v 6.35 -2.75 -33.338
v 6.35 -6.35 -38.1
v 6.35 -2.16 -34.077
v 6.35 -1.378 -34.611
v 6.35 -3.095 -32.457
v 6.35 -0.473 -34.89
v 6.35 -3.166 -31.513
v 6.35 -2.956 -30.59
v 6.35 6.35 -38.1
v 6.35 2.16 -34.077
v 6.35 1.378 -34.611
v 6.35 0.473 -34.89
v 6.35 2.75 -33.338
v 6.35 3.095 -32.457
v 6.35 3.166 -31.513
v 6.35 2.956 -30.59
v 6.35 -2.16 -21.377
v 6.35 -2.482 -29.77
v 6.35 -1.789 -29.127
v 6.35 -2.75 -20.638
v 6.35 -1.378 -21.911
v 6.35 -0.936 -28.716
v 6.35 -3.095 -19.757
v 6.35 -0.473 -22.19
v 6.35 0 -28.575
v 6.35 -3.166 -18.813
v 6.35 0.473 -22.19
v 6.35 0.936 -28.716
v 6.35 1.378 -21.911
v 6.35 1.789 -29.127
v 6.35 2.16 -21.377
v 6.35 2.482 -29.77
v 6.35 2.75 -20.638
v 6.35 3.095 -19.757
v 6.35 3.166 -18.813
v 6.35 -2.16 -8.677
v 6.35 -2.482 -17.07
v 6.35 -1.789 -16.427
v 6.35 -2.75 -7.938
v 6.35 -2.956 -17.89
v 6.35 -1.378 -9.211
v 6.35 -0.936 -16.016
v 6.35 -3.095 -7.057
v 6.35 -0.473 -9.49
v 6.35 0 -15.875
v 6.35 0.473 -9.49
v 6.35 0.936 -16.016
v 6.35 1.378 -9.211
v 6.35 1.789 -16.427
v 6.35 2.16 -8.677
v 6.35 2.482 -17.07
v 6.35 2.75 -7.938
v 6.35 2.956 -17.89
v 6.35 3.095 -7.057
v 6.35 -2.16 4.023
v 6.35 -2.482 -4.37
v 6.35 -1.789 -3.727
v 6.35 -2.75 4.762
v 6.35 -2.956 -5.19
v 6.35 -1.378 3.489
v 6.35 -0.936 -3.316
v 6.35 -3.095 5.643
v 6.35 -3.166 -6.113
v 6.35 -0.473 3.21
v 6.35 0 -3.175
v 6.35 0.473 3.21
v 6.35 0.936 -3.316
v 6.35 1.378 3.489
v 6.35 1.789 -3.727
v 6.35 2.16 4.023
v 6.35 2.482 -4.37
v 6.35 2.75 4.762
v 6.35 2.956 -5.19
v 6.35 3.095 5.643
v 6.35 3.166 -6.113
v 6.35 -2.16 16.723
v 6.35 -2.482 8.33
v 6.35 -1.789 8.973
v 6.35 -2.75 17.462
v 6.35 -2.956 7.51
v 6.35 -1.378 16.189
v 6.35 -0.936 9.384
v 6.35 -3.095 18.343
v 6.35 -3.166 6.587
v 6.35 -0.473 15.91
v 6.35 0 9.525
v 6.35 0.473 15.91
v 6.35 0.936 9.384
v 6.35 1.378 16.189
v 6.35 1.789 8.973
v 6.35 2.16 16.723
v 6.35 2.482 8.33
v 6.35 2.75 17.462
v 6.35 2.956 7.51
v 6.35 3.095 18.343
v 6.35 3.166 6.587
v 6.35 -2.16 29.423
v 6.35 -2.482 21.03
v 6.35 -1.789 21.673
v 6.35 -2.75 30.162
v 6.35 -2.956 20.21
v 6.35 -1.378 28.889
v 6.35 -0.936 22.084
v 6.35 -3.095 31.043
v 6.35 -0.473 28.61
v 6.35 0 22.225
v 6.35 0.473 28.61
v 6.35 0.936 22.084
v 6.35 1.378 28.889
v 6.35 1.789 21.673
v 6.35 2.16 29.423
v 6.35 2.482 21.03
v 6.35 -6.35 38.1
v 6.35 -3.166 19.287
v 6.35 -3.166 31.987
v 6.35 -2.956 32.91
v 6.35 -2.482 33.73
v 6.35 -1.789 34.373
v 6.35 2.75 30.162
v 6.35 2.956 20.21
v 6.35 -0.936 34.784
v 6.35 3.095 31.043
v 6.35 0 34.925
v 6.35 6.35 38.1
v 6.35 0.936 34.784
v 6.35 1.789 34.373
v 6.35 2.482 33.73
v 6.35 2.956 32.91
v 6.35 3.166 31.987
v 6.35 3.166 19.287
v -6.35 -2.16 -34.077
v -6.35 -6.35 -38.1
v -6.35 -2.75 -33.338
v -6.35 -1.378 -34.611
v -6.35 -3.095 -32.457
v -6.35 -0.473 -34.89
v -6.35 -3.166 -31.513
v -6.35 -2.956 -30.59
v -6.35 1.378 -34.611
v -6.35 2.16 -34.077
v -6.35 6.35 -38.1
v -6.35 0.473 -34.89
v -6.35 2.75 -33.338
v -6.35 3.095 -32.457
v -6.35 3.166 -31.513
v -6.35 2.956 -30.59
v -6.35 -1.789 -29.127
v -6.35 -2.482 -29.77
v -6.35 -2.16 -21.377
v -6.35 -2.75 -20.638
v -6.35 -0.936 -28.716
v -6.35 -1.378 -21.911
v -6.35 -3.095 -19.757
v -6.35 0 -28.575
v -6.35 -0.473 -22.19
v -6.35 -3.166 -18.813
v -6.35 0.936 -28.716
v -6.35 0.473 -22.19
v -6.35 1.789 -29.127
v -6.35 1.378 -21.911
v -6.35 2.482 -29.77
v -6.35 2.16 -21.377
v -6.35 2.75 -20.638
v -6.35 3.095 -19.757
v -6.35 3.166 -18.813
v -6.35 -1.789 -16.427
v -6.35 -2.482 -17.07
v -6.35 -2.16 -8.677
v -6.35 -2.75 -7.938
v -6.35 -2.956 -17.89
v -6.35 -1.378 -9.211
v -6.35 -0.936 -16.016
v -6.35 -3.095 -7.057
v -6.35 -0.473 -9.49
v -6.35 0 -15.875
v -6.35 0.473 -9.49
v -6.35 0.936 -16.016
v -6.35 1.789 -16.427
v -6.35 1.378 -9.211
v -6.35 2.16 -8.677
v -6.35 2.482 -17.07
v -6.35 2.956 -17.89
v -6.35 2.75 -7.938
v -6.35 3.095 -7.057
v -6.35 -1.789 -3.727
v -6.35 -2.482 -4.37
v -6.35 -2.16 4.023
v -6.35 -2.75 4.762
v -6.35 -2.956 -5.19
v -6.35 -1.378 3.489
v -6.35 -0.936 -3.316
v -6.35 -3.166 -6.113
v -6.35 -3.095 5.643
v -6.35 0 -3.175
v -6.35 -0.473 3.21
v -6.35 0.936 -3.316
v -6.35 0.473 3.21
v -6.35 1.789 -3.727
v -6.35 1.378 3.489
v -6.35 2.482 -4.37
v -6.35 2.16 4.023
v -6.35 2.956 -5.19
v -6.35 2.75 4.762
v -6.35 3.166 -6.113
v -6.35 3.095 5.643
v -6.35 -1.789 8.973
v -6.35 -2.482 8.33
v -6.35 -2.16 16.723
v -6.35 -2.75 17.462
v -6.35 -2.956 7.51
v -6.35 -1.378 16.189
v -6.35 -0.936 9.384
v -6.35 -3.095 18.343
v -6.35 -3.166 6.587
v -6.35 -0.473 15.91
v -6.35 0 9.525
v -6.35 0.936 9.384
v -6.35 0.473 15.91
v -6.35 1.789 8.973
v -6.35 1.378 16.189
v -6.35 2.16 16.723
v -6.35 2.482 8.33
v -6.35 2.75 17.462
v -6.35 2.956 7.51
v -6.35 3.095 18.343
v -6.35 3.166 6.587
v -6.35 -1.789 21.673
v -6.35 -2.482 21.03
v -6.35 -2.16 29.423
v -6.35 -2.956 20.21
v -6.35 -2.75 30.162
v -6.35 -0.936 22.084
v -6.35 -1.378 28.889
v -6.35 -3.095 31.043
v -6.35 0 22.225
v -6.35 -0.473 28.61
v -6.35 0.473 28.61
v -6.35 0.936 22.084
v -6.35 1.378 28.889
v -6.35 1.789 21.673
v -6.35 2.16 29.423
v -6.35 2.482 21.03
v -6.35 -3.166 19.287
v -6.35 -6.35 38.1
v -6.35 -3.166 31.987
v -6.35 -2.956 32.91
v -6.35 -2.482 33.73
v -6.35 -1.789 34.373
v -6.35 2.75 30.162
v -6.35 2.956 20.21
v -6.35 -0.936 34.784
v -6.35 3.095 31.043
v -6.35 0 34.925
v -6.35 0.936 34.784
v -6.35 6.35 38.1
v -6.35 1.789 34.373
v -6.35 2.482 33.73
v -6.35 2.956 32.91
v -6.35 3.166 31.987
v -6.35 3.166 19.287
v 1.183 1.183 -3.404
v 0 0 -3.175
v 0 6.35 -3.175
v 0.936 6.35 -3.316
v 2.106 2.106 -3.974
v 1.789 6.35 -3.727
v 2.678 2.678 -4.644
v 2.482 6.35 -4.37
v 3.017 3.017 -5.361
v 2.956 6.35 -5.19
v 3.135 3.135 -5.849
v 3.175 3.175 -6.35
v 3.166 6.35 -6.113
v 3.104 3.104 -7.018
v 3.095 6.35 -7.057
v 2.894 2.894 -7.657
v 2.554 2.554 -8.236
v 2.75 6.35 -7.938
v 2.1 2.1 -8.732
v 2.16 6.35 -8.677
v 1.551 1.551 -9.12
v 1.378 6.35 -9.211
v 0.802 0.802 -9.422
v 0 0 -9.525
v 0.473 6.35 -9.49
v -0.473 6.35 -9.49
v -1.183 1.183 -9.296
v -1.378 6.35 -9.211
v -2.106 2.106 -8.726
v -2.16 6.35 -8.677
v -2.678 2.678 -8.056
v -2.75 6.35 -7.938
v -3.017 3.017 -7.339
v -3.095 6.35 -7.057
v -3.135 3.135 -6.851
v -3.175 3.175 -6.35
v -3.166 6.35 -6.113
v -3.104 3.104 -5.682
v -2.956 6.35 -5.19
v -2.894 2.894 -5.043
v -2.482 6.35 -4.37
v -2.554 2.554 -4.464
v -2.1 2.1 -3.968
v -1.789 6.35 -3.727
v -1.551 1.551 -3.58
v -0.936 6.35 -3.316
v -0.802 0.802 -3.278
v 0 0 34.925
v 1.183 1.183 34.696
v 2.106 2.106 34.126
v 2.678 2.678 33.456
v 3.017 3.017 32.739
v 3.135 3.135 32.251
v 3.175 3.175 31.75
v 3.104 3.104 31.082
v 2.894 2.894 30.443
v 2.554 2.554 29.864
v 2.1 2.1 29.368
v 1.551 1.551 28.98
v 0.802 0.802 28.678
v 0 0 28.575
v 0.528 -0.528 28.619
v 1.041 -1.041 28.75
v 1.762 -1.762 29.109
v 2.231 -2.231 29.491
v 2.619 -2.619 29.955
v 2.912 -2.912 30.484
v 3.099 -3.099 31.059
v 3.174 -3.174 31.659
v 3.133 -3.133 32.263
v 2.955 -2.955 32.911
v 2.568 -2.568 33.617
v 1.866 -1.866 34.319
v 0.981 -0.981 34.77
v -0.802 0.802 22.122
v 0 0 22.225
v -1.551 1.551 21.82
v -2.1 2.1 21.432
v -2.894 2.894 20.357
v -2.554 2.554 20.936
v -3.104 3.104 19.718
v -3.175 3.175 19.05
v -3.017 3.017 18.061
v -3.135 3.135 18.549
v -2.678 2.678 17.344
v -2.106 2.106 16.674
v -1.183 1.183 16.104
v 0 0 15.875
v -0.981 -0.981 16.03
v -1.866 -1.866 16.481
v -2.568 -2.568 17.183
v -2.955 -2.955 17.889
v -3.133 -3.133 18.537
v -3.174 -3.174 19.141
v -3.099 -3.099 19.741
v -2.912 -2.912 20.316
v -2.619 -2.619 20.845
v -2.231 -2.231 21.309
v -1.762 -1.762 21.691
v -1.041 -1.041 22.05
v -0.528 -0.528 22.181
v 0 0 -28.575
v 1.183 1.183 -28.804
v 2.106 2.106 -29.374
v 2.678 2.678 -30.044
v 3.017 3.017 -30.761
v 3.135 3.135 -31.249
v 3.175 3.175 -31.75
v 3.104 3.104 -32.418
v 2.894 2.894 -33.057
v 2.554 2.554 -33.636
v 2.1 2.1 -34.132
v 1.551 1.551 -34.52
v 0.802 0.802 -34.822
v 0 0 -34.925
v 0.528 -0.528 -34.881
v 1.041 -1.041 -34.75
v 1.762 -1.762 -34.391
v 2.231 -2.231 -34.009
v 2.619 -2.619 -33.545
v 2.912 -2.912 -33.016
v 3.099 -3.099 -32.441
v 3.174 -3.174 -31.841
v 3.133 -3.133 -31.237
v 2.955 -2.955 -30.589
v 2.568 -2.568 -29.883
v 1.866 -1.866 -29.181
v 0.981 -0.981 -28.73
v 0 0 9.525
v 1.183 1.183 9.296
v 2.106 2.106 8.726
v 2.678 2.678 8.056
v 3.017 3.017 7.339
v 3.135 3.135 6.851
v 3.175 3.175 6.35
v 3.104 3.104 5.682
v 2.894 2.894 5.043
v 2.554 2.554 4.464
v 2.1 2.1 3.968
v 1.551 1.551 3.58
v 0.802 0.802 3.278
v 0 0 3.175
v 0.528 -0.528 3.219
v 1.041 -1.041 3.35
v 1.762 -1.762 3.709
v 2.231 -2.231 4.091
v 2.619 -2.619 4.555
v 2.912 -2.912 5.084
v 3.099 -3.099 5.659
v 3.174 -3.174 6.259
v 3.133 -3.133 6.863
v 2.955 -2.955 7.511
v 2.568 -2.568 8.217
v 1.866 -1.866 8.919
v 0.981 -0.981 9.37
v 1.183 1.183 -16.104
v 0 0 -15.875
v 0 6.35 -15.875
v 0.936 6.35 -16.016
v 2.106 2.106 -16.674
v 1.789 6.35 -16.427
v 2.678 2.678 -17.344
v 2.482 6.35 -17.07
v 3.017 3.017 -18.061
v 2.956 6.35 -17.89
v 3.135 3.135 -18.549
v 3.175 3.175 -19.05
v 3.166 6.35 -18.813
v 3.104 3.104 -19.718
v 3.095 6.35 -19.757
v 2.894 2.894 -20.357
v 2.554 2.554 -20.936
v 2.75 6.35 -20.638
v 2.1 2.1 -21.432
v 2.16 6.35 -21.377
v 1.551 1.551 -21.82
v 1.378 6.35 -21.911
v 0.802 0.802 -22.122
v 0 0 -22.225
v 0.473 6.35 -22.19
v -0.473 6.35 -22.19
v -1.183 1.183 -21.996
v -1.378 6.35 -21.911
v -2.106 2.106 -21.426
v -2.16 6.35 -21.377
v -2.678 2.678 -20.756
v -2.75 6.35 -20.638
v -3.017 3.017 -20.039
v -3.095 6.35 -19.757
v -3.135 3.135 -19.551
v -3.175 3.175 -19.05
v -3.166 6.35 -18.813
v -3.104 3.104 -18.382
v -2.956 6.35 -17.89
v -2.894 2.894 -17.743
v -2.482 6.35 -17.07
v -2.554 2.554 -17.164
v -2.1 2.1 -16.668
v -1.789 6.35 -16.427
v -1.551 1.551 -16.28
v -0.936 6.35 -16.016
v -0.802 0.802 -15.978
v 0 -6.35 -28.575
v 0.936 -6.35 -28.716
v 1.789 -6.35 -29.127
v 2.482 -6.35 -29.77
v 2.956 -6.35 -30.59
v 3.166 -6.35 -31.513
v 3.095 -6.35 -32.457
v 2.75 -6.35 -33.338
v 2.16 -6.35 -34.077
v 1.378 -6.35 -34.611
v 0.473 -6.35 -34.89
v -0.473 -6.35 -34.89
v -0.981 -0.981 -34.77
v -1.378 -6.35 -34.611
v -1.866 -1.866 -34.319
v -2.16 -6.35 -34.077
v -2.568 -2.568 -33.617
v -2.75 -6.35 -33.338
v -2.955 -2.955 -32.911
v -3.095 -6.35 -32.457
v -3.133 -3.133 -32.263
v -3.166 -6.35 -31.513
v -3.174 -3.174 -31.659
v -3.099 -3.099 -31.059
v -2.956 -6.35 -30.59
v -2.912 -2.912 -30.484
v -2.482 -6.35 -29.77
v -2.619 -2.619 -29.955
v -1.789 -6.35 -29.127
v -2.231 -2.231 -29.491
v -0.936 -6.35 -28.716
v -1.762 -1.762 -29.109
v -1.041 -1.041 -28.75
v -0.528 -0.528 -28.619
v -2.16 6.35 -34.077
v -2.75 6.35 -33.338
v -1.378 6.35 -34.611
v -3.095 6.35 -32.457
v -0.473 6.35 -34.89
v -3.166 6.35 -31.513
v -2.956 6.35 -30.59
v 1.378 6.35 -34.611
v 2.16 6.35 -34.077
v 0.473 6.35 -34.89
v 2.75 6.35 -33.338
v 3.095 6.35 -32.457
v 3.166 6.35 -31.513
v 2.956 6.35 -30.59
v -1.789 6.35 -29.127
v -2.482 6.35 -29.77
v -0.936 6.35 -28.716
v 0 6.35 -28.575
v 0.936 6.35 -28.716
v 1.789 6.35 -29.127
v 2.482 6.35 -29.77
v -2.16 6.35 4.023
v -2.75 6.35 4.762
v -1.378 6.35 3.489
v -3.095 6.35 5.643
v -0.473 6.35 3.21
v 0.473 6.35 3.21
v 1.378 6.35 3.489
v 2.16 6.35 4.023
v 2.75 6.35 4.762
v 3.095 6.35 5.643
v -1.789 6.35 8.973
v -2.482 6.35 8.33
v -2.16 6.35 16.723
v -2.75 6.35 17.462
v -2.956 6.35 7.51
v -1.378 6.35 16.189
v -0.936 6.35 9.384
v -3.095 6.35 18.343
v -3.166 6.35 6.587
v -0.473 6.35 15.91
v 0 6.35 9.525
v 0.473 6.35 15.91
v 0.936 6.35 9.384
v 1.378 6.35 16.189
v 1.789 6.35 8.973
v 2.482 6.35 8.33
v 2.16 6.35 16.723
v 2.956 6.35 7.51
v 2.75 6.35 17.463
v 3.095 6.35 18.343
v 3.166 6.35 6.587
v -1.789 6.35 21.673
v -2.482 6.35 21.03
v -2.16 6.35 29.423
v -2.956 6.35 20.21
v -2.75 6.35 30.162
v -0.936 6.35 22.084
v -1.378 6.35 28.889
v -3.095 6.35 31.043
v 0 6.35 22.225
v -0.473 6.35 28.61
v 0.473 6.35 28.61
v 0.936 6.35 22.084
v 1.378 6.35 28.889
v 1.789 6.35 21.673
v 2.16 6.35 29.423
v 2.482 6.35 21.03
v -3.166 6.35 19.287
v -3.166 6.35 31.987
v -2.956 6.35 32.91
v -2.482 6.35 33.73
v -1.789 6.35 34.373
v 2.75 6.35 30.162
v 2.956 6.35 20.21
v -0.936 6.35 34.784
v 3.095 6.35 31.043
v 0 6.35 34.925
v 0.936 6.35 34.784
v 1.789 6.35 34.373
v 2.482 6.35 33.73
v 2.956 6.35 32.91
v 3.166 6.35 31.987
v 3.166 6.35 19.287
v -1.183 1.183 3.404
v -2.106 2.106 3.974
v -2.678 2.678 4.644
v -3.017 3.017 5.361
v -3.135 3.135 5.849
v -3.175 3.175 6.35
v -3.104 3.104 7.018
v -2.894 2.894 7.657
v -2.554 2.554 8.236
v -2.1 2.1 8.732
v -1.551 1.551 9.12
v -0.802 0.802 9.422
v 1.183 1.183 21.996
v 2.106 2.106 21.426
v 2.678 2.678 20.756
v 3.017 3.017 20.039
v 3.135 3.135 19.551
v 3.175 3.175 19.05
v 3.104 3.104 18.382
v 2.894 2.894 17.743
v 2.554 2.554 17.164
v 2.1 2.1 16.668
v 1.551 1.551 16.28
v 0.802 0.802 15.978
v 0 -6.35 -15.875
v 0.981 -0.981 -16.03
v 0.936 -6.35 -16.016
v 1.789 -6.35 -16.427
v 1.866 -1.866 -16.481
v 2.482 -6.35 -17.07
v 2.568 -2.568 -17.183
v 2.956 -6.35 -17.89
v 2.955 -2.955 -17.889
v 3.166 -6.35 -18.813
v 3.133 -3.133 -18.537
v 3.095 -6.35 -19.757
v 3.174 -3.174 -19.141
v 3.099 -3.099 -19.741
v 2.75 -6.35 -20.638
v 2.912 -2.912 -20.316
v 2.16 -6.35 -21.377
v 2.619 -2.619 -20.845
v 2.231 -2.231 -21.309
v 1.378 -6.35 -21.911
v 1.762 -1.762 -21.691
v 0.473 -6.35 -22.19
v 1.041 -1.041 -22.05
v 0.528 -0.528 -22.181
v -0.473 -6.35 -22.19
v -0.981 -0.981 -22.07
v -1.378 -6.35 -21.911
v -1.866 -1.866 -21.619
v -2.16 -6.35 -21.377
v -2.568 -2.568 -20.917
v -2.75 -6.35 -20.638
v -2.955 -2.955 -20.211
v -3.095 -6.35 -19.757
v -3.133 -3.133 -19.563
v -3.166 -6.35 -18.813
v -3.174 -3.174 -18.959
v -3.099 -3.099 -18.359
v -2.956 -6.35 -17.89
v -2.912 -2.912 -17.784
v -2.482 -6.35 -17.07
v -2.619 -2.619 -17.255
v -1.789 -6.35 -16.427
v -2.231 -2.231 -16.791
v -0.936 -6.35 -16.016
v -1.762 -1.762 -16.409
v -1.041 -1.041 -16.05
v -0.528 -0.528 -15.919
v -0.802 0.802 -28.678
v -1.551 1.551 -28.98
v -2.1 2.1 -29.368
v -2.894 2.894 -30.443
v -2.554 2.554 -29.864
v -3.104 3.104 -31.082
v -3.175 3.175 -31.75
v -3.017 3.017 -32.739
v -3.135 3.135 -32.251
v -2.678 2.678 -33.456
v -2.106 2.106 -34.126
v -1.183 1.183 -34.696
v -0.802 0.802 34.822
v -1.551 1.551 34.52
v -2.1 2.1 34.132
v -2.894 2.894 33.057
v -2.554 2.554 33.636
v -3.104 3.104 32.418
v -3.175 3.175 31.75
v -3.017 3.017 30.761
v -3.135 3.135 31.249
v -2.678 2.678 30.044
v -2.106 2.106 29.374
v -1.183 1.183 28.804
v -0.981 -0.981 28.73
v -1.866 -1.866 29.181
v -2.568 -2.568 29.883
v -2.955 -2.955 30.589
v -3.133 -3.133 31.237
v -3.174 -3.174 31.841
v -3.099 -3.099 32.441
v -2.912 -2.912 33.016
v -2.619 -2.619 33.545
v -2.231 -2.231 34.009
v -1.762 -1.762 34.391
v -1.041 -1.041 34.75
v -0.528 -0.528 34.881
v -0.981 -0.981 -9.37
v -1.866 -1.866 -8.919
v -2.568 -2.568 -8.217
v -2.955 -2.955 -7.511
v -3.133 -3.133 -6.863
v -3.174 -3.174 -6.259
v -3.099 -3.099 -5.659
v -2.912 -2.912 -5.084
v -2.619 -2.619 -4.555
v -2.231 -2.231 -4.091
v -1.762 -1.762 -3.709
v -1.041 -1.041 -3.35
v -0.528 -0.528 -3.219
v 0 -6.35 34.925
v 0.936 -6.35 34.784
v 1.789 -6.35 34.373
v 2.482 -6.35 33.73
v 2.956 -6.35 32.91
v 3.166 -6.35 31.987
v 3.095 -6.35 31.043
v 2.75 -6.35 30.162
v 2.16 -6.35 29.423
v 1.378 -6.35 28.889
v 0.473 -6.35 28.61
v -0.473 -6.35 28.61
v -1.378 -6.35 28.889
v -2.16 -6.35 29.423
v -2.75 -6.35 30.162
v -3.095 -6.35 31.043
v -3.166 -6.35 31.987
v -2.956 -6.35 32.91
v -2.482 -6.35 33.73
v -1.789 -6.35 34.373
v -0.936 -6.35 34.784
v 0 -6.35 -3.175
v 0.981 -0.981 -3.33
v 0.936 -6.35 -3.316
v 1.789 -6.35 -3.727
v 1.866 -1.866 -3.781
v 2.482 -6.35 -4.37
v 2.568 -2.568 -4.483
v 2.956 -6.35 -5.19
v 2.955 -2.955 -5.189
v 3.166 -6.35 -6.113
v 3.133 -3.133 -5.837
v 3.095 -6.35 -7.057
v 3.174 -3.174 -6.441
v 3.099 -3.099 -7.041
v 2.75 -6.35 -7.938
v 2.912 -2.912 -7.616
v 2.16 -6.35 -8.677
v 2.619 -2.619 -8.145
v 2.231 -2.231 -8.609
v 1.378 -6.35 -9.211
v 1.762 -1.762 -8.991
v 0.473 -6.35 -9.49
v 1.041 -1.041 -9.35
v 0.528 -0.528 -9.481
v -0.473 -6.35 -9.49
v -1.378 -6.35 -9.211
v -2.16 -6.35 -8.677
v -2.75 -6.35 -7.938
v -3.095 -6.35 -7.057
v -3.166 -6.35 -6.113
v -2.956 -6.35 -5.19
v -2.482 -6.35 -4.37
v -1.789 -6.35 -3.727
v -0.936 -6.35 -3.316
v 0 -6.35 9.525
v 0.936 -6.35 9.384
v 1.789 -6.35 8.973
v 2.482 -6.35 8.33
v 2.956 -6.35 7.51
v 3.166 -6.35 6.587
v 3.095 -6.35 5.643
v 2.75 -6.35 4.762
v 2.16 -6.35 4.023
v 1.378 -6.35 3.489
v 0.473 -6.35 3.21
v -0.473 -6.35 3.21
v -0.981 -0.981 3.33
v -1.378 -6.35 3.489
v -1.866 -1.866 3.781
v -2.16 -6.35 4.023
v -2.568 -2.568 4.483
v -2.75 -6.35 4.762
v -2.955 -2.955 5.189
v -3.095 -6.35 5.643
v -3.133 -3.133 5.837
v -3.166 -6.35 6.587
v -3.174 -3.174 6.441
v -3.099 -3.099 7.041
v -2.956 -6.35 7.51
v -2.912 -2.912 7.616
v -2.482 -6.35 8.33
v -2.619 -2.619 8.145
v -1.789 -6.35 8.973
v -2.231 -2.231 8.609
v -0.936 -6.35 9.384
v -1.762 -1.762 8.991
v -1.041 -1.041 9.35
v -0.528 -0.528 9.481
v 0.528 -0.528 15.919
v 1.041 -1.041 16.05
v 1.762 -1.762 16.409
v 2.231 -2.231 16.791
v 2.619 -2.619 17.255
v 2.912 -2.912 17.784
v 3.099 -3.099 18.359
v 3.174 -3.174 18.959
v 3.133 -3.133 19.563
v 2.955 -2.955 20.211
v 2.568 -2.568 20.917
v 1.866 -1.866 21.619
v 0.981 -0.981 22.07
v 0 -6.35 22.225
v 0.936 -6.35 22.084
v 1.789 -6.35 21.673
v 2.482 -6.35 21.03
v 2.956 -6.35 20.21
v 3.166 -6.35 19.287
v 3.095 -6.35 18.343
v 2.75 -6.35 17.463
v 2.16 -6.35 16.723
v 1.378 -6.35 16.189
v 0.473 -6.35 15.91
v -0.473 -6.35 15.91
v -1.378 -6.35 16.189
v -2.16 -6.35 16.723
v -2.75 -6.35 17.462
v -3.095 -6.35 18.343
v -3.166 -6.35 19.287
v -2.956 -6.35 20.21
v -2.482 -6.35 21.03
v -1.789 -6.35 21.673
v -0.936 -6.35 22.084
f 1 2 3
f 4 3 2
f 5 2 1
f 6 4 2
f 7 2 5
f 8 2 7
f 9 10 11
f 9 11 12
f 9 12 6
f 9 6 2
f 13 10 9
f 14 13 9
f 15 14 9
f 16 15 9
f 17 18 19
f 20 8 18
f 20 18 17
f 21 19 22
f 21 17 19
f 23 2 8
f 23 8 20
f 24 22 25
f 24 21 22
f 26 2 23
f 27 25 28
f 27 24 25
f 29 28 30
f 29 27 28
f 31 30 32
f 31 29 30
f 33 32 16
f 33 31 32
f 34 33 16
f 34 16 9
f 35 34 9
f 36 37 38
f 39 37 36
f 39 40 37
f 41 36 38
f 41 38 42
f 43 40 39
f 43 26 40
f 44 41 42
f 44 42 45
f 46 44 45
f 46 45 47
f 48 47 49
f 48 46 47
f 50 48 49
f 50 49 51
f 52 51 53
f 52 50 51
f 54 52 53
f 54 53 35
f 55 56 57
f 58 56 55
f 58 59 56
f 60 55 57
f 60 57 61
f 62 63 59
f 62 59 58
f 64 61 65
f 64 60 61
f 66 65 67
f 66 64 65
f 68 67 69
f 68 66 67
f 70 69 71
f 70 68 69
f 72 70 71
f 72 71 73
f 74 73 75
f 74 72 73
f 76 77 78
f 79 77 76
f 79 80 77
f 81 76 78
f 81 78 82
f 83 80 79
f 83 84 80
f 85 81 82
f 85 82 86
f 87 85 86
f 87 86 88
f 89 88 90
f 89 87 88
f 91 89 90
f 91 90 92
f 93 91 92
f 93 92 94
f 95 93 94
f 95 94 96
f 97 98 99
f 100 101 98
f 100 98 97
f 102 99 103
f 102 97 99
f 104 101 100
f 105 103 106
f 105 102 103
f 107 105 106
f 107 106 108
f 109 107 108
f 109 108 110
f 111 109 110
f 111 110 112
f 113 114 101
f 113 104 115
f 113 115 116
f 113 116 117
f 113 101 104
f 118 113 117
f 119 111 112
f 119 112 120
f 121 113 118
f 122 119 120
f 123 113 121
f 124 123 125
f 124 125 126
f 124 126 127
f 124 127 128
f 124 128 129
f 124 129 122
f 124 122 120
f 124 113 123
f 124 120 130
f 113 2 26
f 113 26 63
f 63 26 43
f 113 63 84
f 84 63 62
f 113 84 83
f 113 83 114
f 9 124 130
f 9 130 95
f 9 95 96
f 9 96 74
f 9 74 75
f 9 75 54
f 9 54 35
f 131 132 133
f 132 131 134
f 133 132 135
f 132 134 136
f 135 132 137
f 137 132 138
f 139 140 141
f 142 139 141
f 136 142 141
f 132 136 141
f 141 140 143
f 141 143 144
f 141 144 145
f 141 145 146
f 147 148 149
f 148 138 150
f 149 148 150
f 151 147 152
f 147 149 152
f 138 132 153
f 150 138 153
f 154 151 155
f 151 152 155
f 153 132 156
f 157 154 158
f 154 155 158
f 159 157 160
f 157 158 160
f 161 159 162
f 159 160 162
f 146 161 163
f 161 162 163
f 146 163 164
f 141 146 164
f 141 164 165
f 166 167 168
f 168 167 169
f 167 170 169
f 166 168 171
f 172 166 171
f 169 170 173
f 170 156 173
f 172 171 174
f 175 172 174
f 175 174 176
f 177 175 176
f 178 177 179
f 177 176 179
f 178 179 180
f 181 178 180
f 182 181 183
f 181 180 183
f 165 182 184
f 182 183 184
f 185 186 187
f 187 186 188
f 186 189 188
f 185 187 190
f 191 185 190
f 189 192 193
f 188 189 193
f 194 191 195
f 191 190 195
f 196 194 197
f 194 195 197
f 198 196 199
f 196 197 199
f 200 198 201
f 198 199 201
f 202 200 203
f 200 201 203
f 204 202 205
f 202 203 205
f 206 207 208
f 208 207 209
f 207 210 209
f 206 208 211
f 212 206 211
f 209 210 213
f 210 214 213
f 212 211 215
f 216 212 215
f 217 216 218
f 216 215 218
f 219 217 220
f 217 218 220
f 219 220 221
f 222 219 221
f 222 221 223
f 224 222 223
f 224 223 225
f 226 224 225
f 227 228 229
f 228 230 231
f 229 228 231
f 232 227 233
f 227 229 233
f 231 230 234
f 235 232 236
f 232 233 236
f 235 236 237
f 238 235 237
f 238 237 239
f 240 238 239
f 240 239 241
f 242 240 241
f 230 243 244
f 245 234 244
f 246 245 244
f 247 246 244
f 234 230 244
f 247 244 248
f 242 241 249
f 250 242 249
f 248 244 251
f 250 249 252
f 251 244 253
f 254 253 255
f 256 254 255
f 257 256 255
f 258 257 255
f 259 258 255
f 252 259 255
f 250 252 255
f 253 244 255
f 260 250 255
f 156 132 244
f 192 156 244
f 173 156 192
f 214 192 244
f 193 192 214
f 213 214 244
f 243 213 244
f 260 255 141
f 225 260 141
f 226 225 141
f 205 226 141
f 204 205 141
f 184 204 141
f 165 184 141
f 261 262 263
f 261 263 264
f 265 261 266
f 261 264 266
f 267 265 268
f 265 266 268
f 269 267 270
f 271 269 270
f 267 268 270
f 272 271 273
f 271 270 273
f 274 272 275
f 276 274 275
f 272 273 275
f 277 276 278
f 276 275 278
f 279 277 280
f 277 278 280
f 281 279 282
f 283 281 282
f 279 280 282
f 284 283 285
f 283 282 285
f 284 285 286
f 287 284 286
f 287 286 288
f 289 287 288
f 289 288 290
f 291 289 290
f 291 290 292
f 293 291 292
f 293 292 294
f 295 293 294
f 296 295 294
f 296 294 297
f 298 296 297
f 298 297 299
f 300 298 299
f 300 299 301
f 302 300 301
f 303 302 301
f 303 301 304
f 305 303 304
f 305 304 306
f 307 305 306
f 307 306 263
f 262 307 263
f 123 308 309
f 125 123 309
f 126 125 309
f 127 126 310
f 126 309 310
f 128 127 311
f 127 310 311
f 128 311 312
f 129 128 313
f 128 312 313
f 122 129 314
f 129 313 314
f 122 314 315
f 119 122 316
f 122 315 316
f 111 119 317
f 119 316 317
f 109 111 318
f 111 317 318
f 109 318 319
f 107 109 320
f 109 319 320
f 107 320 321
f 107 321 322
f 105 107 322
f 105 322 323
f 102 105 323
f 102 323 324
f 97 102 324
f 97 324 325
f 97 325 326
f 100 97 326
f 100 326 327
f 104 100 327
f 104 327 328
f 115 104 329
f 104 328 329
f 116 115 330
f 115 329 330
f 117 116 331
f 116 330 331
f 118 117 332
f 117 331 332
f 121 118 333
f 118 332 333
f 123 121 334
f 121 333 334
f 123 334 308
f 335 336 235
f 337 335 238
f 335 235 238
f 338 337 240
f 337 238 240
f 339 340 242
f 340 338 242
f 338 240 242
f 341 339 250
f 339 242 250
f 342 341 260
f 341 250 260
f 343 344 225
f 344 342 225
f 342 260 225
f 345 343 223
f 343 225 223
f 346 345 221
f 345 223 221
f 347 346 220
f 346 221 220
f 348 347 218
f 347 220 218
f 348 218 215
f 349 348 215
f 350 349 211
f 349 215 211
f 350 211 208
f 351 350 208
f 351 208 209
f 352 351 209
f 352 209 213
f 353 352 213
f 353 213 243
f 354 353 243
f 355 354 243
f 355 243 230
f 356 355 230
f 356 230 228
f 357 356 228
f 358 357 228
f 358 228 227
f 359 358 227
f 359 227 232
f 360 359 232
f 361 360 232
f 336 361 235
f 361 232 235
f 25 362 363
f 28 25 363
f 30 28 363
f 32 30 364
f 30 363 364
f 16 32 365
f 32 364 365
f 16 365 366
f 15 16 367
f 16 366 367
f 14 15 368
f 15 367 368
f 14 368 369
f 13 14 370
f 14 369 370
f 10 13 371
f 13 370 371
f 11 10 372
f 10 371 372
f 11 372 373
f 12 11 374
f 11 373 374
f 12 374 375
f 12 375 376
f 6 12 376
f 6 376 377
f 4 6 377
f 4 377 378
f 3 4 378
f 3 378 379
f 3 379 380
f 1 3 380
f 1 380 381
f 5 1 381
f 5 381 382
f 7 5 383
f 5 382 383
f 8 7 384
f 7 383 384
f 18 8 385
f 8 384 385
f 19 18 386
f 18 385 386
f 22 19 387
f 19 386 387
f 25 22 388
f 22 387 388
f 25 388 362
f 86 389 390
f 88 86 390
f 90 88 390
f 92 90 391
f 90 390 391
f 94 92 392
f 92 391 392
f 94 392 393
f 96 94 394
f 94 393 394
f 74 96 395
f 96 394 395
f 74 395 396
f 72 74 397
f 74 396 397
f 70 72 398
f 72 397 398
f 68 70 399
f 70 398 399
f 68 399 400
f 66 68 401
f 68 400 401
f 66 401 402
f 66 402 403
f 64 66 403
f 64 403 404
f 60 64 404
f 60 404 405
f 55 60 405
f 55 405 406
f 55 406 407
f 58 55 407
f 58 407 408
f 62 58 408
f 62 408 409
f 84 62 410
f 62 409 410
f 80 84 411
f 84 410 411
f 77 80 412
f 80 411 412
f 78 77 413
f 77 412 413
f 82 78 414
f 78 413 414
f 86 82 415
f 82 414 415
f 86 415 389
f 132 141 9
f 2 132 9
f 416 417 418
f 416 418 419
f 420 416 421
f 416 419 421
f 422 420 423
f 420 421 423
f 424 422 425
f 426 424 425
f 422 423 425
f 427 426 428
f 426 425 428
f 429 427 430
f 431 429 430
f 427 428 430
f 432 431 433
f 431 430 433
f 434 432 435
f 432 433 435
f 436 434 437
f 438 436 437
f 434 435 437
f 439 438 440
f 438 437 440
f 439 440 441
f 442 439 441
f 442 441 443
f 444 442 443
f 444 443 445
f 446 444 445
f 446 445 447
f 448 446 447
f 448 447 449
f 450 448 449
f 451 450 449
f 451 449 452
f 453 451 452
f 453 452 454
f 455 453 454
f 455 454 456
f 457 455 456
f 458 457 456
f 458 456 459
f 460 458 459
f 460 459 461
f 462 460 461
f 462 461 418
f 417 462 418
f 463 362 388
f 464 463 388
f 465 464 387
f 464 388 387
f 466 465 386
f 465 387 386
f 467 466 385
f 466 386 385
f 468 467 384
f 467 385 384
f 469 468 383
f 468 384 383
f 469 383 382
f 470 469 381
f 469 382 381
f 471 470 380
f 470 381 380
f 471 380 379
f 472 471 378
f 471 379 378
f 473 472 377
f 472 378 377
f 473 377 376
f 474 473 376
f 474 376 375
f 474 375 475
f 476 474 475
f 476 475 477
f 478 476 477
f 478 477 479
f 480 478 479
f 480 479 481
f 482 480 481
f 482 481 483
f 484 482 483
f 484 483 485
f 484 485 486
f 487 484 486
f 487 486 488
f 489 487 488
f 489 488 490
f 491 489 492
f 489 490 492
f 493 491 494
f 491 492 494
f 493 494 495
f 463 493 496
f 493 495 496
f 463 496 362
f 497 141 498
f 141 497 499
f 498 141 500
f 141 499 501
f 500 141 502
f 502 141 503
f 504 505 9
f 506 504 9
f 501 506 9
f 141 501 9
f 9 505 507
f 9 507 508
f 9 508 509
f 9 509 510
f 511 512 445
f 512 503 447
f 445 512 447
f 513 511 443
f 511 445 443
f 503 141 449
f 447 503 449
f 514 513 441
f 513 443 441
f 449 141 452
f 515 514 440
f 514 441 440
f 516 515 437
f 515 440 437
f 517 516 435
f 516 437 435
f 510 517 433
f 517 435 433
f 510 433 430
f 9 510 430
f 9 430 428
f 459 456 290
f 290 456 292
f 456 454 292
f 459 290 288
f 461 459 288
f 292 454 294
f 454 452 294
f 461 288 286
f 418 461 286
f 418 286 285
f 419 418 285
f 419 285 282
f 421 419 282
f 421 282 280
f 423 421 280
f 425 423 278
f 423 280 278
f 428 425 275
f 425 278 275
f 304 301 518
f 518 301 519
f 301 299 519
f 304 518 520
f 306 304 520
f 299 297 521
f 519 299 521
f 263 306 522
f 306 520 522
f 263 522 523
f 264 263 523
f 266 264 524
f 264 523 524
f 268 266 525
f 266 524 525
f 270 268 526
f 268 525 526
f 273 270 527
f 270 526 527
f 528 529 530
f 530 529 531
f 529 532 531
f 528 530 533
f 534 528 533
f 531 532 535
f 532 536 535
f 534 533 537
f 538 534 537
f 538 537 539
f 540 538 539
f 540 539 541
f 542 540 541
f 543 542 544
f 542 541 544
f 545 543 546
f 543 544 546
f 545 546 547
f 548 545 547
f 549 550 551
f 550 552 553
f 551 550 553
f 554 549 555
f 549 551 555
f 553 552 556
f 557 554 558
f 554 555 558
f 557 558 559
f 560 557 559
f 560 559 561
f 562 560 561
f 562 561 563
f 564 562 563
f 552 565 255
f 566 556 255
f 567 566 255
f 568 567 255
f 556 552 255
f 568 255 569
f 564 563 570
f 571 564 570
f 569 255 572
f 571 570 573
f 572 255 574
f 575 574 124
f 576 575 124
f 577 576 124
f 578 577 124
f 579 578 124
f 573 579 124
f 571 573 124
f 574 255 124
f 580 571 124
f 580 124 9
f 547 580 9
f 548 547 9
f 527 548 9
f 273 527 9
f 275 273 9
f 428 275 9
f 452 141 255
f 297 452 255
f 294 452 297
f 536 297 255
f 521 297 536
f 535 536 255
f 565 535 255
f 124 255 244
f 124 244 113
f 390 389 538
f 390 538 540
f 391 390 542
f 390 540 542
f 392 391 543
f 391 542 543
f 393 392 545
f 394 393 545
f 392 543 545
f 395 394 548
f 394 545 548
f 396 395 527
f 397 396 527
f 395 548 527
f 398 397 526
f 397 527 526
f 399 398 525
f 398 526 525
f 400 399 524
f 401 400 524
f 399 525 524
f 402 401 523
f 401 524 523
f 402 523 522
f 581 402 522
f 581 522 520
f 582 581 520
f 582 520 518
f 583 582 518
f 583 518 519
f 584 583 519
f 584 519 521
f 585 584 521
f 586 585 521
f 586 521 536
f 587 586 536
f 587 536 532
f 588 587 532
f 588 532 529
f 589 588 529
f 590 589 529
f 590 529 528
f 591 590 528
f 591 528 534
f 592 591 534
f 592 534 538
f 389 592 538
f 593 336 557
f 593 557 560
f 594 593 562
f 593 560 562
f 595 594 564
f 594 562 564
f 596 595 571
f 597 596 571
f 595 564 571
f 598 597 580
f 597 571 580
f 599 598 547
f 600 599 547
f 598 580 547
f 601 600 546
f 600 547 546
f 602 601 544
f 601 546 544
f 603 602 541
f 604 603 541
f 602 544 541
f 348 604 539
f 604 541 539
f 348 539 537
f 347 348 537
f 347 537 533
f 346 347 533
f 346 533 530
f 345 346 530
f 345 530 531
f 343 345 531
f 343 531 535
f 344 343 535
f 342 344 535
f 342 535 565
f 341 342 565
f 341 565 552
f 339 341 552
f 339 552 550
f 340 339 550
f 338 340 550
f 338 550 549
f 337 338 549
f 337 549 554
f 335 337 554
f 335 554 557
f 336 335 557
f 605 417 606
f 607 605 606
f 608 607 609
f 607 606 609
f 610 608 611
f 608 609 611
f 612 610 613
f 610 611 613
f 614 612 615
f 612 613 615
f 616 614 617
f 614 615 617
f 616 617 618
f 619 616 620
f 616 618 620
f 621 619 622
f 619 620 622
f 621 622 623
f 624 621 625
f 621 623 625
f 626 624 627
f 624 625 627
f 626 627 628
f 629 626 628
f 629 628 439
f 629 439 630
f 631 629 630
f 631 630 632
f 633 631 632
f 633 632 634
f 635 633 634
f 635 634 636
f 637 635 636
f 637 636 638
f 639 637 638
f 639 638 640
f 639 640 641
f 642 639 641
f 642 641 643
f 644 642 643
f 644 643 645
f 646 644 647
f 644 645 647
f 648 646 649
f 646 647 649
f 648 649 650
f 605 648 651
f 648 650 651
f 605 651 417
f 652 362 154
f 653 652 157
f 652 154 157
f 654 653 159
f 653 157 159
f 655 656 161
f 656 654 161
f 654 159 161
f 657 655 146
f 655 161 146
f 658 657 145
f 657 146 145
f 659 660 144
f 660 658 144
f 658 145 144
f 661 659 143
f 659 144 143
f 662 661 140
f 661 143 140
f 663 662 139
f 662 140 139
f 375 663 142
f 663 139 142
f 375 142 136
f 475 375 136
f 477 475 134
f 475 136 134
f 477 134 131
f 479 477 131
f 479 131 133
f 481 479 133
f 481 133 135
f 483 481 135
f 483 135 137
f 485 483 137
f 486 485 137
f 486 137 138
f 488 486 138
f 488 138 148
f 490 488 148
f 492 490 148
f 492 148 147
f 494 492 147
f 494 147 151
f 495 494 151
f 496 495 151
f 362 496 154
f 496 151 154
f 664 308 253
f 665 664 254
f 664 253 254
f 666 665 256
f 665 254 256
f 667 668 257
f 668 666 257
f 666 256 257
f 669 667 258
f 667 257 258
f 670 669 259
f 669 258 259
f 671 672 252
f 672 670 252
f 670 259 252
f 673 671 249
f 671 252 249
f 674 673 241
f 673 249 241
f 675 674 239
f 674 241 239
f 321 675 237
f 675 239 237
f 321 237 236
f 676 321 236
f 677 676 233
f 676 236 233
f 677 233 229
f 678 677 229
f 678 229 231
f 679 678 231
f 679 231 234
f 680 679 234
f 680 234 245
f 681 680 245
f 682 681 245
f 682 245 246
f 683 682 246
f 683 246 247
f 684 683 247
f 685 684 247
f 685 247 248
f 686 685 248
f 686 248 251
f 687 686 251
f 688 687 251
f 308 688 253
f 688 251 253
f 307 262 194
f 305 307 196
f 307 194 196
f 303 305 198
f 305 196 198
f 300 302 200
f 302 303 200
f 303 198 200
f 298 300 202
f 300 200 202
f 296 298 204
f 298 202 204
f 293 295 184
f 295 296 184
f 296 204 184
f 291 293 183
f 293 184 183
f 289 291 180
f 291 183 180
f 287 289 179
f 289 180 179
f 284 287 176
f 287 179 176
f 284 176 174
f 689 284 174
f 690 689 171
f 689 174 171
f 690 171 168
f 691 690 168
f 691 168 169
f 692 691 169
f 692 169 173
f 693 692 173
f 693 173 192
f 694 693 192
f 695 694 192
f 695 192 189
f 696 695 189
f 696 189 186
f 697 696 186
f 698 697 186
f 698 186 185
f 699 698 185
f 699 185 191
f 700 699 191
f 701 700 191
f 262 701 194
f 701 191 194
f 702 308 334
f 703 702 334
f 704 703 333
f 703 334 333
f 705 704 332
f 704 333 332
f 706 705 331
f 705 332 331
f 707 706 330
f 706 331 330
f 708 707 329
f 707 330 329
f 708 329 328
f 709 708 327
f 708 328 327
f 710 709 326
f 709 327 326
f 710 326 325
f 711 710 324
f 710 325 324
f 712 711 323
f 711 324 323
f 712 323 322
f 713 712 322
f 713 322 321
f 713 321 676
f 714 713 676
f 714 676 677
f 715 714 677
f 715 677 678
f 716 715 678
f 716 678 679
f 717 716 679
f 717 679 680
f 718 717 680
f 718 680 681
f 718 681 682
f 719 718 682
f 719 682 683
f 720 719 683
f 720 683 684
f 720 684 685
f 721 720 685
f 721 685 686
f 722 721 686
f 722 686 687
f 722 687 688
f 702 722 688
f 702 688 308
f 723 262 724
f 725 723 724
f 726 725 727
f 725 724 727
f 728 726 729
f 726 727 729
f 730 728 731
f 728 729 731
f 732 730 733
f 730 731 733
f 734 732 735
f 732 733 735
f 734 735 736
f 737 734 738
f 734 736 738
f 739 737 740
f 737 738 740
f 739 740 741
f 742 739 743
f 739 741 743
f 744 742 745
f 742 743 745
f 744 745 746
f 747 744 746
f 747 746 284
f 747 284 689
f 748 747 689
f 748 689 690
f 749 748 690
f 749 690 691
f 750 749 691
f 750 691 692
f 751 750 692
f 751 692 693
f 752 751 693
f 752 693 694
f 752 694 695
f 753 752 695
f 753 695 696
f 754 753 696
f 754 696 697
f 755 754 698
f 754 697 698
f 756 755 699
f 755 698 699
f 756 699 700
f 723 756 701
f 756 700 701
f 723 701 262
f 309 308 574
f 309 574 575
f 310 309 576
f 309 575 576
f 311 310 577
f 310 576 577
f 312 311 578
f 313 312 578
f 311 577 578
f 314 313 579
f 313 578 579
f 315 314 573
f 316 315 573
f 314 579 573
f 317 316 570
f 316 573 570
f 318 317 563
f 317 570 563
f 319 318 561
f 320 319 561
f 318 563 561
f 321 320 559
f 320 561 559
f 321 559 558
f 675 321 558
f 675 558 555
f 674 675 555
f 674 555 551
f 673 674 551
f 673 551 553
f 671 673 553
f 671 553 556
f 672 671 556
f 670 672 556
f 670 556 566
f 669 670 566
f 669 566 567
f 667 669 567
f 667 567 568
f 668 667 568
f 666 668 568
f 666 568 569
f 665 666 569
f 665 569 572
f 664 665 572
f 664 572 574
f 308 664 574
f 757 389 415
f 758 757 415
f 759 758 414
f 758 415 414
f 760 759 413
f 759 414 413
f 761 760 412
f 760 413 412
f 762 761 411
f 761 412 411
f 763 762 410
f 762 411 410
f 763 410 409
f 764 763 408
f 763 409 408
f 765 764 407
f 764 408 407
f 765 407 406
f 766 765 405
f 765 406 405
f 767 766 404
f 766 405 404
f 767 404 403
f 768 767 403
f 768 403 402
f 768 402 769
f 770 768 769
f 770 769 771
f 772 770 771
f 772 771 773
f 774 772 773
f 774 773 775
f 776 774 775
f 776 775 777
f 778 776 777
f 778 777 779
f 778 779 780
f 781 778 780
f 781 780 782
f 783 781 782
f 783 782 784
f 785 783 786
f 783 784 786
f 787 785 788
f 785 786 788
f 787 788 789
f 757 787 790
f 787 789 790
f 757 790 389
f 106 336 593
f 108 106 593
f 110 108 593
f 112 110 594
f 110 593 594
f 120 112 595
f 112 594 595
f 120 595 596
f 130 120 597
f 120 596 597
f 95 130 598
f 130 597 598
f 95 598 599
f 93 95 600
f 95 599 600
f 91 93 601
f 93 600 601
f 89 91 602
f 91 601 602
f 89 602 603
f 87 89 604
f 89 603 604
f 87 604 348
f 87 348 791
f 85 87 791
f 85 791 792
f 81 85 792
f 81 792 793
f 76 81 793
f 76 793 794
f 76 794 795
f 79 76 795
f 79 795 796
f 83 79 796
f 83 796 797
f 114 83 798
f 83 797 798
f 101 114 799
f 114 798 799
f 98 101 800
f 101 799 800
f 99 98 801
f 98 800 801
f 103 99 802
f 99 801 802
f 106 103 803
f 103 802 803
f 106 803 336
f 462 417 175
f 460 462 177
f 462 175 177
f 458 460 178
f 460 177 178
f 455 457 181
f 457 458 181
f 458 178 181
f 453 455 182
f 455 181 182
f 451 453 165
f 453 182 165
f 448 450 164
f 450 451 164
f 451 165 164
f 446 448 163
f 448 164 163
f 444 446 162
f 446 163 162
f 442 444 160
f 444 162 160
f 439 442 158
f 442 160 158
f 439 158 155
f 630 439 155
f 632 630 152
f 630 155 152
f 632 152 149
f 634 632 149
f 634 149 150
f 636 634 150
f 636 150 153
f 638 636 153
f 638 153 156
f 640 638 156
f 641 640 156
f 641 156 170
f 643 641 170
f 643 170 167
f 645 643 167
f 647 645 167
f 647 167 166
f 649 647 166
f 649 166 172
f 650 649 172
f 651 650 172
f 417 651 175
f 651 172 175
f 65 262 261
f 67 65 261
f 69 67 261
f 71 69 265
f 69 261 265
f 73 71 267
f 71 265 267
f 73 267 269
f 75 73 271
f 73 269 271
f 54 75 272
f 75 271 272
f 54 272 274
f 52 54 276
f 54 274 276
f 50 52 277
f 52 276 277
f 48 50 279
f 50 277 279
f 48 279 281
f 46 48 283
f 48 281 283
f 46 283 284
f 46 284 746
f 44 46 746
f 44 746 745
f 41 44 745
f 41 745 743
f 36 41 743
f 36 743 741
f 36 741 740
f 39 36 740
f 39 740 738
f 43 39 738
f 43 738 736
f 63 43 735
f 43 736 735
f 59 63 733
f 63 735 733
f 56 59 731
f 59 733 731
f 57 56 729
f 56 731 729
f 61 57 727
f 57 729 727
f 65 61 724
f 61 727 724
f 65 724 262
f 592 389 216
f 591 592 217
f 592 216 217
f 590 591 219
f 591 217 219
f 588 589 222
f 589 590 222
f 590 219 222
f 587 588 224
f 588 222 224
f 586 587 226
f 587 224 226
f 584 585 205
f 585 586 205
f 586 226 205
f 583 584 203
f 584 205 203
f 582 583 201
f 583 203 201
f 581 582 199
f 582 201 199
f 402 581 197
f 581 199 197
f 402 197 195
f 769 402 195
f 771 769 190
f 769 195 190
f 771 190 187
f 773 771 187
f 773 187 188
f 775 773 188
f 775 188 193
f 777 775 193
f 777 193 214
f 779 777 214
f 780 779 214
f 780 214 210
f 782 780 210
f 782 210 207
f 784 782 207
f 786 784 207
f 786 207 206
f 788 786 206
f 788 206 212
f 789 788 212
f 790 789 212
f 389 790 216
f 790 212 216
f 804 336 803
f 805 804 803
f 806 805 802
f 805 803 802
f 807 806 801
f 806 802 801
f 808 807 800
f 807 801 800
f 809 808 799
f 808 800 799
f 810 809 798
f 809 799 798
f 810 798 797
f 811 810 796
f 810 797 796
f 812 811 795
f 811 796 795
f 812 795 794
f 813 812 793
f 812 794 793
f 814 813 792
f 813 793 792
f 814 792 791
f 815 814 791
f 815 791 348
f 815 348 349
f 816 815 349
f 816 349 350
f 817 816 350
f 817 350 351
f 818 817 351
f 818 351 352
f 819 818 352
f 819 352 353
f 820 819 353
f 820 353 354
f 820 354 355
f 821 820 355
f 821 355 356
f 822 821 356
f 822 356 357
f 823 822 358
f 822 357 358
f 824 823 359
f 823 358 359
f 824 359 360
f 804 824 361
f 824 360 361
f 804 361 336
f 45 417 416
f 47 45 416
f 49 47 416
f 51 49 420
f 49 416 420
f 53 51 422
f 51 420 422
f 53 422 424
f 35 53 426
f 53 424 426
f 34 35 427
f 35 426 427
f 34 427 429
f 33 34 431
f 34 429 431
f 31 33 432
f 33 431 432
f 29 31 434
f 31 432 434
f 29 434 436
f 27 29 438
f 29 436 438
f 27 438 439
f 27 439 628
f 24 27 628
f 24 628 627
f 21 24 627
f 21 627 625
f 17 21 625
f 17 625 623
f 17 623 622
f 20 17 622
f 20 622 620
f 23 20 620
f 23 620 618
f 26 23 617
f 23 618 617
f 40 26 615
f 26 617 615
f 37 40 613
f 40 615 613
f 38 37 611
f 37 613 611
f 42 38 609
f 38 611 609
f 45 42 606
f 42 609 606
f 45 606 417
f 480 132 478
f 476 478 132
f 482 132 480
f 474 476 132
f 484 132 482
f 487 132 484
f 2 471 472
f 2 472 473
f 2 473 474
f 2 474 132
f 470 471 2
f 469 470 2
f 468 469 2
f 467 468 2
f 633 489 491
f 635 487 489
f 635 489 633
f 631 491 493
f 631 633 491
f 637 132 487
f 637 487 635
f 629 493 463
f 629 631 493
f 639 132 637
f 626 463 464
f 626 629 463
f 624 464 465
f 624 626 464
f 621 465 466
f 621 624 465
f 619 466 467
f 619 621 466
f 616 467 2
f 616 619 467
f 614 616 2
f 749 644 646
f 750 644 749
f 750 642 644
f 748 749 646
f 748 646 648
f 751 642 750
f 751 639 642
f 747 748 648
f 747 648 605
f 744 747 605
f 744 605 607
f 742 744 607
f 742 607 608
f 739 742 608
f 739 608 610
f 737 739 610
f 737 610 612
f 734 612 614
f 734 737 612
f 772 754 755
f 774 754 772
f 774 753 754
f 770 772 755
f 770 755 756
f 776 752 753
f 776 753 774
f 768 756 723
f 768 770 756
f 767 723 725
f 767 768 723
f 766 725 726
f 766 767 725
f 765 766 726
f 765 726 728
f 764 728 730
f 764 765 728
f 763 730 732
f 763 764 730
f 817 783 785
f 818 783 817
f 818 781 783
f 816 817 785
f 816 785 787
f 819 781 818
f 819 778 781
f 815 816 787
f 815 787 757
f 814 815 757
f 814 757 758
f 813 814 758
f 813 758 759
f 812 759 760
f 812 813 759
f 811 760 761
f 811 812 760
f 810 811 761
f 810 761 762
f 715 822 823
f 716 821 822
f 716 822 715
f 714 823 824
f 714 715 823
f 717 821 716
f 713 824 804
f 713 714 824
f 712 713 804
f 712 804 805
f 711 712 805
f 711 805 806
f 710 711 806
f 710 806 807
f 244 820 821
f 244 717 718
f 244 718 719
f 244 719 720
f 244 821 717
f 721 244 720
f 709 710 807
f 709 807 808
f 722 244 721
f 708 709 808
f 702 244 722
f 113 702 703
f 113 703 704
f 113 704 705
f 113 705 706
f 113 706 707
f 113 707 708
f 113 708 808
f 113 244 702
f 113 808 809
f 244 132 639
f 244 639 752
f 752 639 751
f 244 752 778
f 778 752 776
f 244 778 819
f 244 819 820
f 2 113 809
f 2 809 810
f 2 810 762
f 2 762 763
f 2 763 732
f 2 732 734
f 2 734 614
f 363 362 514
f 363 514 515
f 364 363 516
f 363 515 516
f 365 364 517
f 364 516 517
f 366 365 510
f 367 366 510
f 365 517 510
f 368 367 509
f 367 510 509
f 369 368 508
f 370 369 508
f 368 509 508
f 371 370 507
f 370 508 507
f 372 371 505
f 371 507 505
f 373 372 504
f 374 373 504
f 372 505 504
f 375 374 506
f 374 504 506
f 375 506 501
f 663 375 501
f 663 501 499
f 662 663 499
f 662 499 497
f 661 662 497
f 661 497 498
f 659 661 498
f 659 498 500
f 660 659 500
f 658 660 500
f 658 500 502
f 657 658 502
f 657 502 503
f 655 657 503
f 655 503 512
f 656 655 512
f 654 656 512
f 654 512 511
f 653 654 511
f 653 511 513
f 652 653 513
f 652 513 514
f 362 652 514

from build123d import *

# Parameters (mm, degrees)
SKETCH1_W           = 12.7
SKETCH1_H           = 12.7
BOSS_EXTRUDE1_DEPTH = 38.1
SKETCH2_R           = 3.175
CUT_EXTRUDE1_DEPTH  = 41.659838908
SKETCH4_R           = 3.175
CUT_EXTRUDE2_DEPTH  = 41.659838908


with BuildPart() as part:
    # Sketch1 → Boss-Extrude1 (new, symmetric)
    with BuildSketch(Plane.XY):
        Rectangle(SKETCH1_W, SKETCH1_H)
    extrude(amount=BOSS_EXTRUDE1_DEPTH, both=True)

    # Sketch2 → Cut-Extrude1 (cut, through all)
    with BuildSketch(Plane(origin=(0, 6.35, 0), x_dir=(1, 0, 0), z_dir=(0, 1, 0))):
        with Locations(Location((0, 31.75, 0), (0, 0, 270))):
            Circle(SKETCH2_R)
        with Locations(Location((0, 19.05, 0), (0, 0, 270))):
            Circle(SKETCH2_R)
        with Locations(Location((0, 6.35, 0), (0, 0, 270))):
            Circle(SKETCH2_R)
        with Locations(Location((0, -6.35, 0), (0, 0, 270))):
            Circle(SKETCH2_R)
        with Locations(Location((0, -19.05, 0), (0, 0, 270))):
            Circle(SKETCH2_R)
        with Locations(Location((0, -31.75, 0), (0, 0, 270))):
            Circle(SKETCH2_R)
    extrude(amount=-CUT_EXTRUDE1_DEPTH, mode=Mode.SUBTRACT)

    # Sketch4 → Cut-Extrude2 (cut, through all)
    with BuildSketch(Plane.ZY.offset(6.35)):
        with Locations((31.75, 0)):
            Circle(SKETCH4_R)
        with Locations((19.05, 0)):
            Circle(SKETCH4_R)
        with Locations((6.35, 0)):
            Circle(SKETCH4_R)
        with Locations((-6.35, 0)):
            Circle(SKETCH4_R)
        with Locations((-19.05, 0)):
            Circle(SKETCH4_R)
        with Locations((-31.75, 0)):
            Circle(SKETCH4_R)
    extrude(amount=-CUT_EXTRUDE2_DEPTH, mode=Mode.SUBTRACT)


solid = part.part
